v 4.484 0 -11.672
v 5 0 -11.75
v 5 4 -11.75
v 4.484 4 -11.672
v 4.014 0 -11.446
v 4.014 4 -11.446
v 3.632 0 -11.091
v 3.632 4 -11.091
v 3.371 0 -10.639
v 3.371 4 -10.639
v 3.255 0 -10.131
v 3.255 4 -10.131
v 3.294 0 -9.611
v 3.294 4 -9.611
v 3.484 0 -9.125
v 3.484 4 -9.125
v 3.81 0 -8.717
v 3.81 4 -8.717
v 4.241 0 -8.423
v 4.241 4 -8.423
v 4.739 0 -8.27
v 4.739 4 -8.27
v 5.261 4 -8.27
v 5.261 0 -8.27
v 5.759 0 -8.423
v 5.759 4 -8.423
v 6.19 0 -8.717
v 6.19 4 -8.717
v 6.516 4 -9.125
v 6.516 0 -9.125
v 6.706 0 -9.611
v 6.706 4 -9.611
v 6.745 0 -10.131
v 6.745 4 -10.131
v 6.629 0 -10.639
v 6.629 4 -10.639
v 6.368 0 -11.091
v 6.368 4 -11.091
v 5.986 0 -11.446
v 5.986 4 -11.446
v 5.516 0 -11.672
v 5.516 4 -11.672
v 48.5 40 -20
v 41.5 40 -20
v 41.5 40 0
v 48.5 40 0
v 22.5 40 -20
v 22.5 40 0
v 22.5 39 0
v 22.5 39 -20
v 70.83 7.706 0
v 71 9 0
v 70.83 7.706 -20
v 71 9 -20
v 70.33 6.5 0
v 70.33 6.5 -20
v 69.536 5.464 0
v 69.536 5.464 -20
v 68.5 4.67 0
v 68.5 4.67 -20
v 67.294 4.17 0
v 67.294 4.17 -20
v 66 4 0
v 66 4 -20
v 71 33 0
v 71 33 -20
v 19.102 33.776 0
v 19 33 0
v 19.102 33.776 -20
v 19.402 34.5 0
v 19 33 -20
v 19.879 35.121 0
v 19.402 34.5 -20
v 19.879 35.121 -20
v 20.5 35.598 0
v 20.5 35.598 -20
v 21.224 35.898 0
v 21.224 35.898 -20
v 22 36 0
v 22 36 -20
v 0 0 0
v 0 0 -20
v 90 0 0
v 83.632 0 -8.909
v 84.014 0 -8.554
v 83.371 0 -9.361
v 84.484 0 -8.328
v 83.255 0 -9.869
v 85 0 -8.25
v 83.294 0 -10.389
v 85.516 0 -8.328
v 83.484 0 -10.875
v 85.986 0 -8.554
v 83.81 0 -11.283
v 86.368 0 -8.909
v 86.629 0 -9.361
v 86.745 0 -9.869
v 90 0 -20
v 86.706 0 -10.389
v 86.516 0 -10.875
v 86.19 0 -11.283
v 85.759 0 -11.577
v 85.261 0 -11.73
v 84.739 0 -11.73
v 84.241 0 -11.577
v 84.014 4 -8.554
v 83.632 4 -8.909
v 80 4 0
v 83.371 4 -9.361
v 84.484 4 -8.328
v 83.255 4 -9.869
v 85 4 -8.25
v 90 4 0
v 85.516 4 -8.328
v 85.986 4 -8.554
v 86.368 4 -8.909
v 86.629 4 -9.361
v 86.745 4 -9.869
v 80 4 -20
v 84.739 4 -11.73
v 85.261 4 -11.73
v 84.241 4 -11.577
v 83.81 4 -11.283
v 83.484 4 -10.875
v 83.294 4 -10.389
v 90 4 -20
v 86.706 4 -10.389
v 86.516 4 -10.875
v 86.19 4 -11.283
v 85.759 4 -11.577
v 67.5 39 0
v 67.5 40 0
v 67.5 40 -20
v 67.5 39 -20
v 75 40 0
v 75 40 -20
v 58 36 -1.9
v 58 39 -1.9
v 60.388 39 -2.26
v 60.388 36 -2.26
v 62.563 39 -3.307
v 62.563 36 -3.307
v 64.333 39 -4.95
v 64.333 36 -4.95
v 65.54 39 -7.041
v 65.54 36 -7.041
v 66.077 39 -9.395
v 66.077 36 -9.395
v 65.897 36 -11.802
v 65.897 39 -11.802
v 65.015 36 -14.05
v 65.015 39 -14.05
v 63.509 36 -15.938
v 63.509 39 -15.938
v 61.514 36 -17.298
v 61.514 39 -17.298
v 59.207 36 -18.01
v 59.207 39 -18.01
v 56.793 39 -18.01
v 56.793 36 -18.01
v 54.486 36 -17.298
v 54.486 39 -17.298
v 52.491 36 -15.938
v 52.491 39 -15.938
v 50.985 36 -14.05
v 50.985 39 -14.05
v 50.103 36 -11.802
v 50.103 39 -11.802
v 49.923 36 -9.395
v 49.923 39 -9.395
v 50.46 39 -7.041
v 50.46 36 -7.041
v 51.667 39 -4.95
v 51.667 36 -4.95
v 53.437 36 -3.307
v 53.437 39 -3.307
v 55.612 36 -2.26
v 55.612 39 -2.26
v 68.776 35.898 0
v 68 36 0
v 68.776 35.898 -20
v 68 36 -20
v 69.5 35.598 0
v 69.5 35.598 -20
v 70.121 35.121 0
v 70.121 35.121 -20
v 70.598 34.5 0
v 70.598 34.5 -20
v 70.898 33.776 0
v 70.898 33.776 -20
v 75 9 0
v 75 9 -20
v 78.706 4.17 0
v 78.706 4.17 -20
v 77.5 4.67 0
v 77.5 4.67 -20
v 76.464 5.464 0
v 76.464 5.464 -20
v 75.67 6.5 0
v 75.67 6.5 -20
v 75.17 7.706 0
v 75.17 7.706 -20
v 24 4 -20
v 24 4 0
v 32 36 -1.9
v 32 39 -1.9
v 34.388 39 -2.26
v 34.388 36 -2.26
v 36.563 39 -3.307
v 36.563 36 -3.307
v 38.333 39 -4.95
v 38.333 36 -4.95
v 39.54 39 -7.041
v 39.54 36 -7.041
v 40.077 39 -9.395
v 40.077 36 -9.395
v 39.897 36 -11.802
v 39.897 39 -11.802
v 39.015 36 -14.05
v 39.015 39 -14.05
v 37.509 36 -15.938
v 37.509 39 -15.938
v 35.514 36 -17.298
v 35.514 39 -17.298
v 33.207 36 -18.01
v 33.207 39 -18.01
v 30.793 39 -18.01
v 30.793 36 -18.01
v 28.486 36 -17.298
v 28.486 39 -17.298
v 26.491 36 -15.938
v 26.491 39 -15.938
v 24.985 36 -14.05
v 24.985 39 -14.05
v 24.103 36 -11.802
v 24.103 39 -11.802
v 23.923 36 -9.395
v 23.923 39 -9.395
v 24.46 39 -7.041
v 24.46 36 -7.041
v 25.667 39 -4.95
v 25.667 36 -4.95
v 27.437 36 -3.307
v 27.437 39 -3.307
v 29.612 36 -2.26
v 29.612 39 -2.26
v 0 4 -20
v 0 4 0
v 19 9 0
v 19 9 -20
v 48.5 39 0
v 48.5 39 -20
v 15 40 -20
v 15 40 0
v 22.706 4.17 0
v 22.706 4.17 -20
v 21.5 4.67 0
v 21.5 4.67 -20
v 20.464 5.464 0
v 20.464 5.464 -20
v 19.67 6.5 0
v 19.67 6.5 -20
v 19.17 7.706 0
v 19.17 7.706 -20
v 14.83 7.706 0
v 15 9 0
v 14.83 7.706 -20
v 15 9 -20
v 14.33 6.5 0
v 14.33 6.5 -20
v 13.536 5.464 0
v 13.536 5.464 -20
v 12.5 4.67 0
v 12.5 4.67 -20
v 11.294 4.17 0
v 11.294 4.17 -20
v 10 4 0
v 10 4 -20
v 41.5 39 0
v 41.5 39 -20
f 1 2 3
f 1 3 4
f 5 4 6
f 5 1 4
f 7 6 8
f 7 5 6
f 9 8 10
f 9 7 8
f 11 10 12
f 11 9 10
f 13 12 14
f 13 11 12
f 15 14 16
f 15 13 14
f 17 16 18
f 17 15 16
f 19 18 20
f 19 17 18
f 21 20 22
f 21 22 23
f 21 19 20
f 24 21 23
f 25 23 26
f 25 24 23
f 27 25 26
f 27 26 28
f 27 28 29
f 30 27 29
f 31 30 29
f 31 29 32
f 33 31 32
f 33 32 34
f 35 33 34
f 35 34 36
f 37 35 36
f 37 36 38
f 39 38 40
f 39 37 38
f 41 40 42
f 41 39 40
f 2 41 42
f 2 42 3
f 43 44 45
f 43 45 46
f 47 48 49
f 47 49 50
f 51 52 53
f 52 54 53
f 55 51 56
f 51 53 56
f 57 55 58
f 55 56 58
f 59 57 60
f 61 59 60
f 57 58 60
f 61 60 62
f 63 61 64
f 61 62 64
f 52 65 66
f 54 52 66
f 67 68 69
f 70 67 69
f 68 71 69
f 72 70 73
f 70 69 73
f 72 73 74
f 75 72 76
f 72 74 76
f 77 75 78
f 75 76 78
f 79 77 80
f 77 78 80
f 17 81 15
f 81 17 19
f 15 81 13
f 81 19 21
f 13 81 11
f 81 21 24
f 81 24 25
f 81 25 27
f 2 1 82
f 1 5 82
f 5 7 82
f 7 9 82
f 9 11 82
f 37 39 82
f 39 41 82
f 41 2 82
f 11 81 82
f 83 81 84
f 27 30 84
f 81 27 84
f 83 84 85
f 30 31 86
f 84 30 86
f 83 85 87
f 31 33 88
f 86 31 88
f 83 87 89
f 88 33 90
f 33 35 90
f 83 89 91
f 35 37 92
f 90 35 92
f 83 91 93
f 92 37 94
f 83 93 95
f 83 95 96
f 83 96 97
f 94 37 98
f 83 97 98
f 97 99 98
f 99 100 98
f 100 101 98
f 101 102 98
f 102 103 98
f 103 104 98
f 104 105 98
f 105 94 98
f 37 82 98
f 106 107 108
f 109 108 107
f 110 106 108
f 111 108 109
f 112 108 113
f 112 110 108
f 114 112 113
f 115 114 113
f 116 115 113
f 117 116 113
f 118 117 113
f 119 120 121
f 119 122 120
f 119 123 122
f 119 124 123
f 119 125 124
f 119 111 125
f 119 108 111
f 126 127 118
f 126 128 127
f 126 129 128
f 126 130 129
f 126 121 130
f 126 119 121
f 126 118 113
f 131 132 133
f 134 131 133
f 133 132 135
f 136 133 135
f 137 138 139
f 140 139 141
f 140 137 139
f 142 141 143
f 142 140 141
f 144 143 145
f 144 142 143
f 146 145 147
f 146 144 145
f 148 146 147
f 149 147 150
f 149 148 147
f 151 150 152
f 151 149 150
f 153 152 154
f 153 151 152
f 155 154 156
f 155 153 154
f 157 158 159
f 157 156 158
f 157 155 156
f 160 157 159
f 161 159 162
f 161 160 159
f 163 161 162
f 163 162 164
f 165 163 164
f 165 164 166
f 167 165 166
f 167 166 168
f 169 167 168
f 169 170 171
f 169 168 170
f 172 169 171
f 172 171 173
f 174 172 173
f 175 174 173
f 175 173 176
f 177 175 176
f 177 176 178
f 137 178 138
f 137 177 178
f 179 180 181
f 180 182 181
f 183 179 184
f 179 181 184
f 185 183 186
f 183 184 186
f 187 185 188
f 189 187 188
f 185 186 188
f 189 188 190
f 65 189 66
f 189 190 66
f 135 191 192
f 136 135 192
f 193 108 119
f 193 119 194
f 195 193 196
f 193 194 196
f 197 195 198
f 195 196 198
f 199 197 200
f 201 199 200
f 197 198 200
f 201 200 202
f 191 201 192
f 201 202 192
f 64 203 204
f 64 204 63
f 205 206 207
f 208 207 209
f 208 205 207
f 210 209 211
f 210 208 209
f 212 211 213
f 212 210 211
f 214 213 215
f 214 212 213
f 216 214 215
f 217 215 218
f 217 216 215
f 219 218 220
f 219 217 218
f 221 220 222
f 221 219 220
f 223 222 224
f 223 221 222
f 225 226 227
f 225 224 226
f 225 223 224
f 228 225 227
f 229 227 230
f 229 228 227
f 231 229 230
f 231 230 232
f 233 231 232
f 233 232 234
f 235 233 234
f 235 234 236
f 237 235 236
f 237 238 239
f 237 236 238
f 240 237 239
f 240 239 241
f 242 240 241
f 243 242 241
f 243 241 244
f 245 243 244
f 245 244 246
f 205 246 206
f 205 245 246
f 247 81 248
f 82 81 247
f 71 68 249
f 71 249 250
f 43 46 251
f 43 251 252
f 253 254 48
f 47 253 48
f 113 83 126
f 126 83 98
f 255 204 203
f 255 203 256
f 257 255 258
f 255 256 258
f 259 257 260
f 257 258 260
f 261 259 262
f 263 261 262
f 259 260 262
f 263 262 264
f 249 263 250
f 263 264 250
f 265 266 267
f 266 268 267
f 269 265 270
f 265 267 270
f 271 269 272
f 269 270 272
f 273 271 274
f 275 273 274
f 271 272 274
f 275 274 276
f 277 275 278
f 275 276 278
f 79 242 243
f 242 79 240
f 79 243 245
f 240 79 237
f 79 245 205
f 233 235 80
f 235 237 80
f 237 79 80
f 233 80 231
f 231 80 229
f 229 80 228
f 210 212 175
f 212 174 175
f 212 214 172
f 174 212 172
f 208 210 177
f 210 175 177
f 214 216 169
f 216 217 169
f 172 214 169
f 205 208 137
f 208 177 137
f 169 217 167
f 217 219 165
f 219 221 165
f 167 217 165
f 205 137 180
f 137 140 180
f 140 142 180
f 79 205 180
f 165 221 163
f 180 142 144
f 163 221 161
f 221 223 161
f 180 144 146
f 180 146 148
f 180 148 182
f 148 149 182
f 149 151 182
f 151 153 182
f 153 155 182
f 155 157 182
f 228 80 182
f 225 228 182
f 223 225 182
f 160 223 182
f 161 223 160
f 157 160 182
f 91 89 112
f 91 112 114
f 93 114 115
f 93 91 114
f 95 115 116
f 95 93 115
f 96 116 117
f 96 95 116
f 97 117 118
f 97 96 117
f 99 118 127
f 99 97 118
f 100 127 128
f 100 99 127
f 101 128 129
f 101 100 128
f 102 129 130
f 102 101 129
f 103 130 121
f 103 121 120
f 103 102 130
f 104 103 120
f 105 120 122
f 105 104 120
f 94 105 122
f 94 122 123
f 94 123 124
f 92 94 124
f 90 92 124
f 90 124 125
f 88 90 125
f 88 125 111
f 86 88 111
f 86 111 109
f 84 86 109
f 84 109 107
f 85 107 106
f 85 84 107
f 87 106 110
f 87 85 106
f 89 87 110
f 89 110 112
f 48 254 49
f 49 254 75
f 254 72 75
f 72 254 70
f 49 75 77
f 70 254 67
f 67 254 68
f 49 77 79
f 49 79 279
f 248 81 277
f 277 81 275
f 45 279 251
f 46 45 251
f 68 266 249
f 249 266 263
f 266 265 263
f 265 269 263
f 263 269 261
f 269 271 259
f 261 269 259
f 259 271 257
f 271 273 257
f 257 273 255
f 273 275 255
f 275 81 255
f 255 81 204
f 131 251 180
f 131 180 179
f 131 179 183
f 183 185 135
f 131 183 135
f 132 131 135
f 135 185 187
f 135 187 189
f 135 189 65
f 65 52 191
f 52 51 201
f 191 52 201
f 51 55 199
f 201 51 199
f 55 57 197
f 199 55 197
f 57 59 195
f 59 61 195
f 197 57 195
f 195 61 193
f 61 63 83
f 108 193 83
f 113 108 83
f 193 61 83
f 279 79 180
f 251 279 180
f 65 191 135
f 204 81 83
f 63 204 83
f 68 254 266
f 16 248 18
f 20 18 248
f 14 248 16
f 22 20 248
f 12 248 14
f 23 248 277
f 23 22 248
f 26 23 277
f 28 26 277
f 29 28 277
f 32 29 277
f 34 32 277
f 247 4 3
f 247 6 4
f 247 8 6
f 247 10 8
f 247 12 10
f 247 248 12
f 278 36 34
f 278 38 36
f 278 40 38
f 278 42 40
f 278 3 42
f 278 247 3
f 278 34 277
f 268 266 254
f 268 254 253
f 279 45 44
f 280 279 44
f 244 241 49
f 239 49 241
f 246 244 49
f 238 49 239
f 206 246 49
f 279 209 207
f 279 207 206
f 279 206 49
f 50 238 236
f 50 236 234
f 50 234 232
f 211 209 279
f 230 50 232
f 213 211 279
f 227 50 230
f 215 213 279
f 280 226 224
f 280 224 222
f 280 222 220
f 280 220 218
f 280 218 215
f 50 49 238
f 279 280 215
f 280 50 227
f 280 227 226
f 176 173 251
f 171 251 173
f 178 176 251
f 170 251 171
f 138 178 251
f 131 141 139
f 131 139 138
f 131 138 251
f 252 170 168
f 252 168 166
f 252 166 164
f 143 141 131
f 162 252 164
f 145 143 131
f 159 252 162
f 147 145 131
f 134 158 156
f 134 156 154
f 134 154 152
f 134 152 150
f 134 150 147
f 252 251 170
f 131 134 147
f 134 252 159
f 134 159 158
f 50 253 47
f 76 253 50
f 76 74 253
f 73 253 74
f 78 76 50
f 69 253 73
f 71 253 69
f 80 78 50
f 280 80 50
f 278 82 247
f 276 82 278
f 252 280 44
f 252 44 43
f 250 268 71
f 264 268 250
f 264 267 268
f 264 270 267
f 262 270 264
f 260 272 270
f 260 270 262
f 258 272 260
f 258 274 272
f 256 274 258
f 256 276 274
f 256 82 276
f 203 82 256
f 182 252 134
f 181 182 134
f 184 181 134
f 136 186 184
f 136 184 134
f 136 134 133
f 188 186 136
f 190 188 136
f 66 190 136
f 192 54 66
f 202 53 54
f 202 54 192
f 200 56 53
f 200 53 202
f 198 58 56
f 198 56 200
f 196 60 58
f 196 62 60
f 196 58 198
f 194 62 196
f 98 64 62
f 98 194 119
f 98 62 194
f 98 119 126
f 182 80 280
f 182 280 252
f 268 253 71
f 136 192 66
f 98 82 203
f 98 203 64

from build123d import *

# Parameters (mm, degrees)
SKETCH_1_W          = 90
SKETCH_1_H          = 20
SKETCH_1_R          = 1.75
EXTRUDE_1_DEPTH     = 4
SKETCH_2_W          = 4
SKETCH_2_H          = 20
EXTRUDE_2_DEPTH     = 32
SKETCH_3_W          = 60
SKETCH_3_H          = 20
SKETCH_3_R          = 8.1
EXTRUDE_3_DEPTH     = 4
FILLET_1_R          = 5
FILLET_2_R          = 3
SKETCH_4_W          = 19
SKETCH_4_H          = 20
CUT_EXTRUDE_1_DEPTH = 1


with BuildPart() as part:
    # 草图1 → 凸台-拉伸1 (new body)
    with BuildSketch(Plane(origin=(0, 0, 0), x_dir=(1, 0, 0), z_dir=(0, 1, 0))):
        with Locations((45, 10)):
            Rectangle(SKETCH_1_W, SKETCH_1_H)
        with Locations(Location((85, 10, 0), (0, 0, 270))):
            Circle(SKETCH_1_R, mode=Mode.SUBTRACT)
        with Locations(Location((5, 10, 0), (0, 0, 90))):
            Circle(SKETCH_1_R, mode=Mode.SUBTRACT)
    extrude(amount=EXTRUDE_1_DEPTH)

    # 草图2 → 凸台-拉伸2 (add)
    with BuildSketch(Plane(origin=(0, 4, 0), x_dir=(1, 0, 0), z_dir=(0, 1, 0))):
        with Locations((17, 10)):
            Rectangle(SKETCH_2_W, SKETCH_2_H)
        with Locations((73, 10)):
            Rectangle(SKETCH_2_W, SKETCH_2_H)
    extrude(amount=EXTRUDE_2_DEPTH)

    # 草图3 → 凸台-拉伸3 (add)
    with BuildSketch(Plane(origin=(0, 36, 0), x_dir=(1, 0, 0), z_dir=(0, 1, 0))):
        with Locations((45, 10)):
            Rectangle(SKETCH_3_W, SKETCH_3_H)
        with Locations(Location((32, 10, 0), (0, 0, 270))):
            Circle(SKETCH_3_R, mode=Mode.SUBTRACT)
        with Locations(Location((58, 10, 0), (0, 0, 270))):
            Circle(SKETCH_3_R, mode=Mode.SUBTRACT)
    extrude(amount=EXTRUDE_3_DEPTH)

    # 圆角1
    fillet_1_edges = [part.edges().sort_by_distance(p)[0] for p in [
        (15, 4, -10),
        (19, 4, -10),
        (75, 4, -10),
        (71, 4, -10),
    ]]
    fillet(fillet_1_edges, radius=FILLET_1_R)

    # 圆角2
    fillet_2_edges = [part.edges().sort_by_distance(p)[0] for p in [
        (19, 36, -10),
        (71, 36, -10),
    ]]
    fillet(fillet_2_edges, radius=FILLET_2_R)

    # 草图4 → 切除-拉伸1 (cut)
    with BuildSketch(Plane(origin=(0, 40, 0), x_dir=(1, 0, 0), z_dir=(0, 1, 0))):
        with Locations((32, 10)):
            Rectangle(SKETCH_4_W, SKETCH_4_H)
        with Locations((58, 10)):
            Rectangle(SKETCH_4_W, SKETCH_4_H)
    extrude(amount=-CUT_EXTRUDE_1_DEPTH, mode=Mode.SUBTRACT)


solid = part.part
